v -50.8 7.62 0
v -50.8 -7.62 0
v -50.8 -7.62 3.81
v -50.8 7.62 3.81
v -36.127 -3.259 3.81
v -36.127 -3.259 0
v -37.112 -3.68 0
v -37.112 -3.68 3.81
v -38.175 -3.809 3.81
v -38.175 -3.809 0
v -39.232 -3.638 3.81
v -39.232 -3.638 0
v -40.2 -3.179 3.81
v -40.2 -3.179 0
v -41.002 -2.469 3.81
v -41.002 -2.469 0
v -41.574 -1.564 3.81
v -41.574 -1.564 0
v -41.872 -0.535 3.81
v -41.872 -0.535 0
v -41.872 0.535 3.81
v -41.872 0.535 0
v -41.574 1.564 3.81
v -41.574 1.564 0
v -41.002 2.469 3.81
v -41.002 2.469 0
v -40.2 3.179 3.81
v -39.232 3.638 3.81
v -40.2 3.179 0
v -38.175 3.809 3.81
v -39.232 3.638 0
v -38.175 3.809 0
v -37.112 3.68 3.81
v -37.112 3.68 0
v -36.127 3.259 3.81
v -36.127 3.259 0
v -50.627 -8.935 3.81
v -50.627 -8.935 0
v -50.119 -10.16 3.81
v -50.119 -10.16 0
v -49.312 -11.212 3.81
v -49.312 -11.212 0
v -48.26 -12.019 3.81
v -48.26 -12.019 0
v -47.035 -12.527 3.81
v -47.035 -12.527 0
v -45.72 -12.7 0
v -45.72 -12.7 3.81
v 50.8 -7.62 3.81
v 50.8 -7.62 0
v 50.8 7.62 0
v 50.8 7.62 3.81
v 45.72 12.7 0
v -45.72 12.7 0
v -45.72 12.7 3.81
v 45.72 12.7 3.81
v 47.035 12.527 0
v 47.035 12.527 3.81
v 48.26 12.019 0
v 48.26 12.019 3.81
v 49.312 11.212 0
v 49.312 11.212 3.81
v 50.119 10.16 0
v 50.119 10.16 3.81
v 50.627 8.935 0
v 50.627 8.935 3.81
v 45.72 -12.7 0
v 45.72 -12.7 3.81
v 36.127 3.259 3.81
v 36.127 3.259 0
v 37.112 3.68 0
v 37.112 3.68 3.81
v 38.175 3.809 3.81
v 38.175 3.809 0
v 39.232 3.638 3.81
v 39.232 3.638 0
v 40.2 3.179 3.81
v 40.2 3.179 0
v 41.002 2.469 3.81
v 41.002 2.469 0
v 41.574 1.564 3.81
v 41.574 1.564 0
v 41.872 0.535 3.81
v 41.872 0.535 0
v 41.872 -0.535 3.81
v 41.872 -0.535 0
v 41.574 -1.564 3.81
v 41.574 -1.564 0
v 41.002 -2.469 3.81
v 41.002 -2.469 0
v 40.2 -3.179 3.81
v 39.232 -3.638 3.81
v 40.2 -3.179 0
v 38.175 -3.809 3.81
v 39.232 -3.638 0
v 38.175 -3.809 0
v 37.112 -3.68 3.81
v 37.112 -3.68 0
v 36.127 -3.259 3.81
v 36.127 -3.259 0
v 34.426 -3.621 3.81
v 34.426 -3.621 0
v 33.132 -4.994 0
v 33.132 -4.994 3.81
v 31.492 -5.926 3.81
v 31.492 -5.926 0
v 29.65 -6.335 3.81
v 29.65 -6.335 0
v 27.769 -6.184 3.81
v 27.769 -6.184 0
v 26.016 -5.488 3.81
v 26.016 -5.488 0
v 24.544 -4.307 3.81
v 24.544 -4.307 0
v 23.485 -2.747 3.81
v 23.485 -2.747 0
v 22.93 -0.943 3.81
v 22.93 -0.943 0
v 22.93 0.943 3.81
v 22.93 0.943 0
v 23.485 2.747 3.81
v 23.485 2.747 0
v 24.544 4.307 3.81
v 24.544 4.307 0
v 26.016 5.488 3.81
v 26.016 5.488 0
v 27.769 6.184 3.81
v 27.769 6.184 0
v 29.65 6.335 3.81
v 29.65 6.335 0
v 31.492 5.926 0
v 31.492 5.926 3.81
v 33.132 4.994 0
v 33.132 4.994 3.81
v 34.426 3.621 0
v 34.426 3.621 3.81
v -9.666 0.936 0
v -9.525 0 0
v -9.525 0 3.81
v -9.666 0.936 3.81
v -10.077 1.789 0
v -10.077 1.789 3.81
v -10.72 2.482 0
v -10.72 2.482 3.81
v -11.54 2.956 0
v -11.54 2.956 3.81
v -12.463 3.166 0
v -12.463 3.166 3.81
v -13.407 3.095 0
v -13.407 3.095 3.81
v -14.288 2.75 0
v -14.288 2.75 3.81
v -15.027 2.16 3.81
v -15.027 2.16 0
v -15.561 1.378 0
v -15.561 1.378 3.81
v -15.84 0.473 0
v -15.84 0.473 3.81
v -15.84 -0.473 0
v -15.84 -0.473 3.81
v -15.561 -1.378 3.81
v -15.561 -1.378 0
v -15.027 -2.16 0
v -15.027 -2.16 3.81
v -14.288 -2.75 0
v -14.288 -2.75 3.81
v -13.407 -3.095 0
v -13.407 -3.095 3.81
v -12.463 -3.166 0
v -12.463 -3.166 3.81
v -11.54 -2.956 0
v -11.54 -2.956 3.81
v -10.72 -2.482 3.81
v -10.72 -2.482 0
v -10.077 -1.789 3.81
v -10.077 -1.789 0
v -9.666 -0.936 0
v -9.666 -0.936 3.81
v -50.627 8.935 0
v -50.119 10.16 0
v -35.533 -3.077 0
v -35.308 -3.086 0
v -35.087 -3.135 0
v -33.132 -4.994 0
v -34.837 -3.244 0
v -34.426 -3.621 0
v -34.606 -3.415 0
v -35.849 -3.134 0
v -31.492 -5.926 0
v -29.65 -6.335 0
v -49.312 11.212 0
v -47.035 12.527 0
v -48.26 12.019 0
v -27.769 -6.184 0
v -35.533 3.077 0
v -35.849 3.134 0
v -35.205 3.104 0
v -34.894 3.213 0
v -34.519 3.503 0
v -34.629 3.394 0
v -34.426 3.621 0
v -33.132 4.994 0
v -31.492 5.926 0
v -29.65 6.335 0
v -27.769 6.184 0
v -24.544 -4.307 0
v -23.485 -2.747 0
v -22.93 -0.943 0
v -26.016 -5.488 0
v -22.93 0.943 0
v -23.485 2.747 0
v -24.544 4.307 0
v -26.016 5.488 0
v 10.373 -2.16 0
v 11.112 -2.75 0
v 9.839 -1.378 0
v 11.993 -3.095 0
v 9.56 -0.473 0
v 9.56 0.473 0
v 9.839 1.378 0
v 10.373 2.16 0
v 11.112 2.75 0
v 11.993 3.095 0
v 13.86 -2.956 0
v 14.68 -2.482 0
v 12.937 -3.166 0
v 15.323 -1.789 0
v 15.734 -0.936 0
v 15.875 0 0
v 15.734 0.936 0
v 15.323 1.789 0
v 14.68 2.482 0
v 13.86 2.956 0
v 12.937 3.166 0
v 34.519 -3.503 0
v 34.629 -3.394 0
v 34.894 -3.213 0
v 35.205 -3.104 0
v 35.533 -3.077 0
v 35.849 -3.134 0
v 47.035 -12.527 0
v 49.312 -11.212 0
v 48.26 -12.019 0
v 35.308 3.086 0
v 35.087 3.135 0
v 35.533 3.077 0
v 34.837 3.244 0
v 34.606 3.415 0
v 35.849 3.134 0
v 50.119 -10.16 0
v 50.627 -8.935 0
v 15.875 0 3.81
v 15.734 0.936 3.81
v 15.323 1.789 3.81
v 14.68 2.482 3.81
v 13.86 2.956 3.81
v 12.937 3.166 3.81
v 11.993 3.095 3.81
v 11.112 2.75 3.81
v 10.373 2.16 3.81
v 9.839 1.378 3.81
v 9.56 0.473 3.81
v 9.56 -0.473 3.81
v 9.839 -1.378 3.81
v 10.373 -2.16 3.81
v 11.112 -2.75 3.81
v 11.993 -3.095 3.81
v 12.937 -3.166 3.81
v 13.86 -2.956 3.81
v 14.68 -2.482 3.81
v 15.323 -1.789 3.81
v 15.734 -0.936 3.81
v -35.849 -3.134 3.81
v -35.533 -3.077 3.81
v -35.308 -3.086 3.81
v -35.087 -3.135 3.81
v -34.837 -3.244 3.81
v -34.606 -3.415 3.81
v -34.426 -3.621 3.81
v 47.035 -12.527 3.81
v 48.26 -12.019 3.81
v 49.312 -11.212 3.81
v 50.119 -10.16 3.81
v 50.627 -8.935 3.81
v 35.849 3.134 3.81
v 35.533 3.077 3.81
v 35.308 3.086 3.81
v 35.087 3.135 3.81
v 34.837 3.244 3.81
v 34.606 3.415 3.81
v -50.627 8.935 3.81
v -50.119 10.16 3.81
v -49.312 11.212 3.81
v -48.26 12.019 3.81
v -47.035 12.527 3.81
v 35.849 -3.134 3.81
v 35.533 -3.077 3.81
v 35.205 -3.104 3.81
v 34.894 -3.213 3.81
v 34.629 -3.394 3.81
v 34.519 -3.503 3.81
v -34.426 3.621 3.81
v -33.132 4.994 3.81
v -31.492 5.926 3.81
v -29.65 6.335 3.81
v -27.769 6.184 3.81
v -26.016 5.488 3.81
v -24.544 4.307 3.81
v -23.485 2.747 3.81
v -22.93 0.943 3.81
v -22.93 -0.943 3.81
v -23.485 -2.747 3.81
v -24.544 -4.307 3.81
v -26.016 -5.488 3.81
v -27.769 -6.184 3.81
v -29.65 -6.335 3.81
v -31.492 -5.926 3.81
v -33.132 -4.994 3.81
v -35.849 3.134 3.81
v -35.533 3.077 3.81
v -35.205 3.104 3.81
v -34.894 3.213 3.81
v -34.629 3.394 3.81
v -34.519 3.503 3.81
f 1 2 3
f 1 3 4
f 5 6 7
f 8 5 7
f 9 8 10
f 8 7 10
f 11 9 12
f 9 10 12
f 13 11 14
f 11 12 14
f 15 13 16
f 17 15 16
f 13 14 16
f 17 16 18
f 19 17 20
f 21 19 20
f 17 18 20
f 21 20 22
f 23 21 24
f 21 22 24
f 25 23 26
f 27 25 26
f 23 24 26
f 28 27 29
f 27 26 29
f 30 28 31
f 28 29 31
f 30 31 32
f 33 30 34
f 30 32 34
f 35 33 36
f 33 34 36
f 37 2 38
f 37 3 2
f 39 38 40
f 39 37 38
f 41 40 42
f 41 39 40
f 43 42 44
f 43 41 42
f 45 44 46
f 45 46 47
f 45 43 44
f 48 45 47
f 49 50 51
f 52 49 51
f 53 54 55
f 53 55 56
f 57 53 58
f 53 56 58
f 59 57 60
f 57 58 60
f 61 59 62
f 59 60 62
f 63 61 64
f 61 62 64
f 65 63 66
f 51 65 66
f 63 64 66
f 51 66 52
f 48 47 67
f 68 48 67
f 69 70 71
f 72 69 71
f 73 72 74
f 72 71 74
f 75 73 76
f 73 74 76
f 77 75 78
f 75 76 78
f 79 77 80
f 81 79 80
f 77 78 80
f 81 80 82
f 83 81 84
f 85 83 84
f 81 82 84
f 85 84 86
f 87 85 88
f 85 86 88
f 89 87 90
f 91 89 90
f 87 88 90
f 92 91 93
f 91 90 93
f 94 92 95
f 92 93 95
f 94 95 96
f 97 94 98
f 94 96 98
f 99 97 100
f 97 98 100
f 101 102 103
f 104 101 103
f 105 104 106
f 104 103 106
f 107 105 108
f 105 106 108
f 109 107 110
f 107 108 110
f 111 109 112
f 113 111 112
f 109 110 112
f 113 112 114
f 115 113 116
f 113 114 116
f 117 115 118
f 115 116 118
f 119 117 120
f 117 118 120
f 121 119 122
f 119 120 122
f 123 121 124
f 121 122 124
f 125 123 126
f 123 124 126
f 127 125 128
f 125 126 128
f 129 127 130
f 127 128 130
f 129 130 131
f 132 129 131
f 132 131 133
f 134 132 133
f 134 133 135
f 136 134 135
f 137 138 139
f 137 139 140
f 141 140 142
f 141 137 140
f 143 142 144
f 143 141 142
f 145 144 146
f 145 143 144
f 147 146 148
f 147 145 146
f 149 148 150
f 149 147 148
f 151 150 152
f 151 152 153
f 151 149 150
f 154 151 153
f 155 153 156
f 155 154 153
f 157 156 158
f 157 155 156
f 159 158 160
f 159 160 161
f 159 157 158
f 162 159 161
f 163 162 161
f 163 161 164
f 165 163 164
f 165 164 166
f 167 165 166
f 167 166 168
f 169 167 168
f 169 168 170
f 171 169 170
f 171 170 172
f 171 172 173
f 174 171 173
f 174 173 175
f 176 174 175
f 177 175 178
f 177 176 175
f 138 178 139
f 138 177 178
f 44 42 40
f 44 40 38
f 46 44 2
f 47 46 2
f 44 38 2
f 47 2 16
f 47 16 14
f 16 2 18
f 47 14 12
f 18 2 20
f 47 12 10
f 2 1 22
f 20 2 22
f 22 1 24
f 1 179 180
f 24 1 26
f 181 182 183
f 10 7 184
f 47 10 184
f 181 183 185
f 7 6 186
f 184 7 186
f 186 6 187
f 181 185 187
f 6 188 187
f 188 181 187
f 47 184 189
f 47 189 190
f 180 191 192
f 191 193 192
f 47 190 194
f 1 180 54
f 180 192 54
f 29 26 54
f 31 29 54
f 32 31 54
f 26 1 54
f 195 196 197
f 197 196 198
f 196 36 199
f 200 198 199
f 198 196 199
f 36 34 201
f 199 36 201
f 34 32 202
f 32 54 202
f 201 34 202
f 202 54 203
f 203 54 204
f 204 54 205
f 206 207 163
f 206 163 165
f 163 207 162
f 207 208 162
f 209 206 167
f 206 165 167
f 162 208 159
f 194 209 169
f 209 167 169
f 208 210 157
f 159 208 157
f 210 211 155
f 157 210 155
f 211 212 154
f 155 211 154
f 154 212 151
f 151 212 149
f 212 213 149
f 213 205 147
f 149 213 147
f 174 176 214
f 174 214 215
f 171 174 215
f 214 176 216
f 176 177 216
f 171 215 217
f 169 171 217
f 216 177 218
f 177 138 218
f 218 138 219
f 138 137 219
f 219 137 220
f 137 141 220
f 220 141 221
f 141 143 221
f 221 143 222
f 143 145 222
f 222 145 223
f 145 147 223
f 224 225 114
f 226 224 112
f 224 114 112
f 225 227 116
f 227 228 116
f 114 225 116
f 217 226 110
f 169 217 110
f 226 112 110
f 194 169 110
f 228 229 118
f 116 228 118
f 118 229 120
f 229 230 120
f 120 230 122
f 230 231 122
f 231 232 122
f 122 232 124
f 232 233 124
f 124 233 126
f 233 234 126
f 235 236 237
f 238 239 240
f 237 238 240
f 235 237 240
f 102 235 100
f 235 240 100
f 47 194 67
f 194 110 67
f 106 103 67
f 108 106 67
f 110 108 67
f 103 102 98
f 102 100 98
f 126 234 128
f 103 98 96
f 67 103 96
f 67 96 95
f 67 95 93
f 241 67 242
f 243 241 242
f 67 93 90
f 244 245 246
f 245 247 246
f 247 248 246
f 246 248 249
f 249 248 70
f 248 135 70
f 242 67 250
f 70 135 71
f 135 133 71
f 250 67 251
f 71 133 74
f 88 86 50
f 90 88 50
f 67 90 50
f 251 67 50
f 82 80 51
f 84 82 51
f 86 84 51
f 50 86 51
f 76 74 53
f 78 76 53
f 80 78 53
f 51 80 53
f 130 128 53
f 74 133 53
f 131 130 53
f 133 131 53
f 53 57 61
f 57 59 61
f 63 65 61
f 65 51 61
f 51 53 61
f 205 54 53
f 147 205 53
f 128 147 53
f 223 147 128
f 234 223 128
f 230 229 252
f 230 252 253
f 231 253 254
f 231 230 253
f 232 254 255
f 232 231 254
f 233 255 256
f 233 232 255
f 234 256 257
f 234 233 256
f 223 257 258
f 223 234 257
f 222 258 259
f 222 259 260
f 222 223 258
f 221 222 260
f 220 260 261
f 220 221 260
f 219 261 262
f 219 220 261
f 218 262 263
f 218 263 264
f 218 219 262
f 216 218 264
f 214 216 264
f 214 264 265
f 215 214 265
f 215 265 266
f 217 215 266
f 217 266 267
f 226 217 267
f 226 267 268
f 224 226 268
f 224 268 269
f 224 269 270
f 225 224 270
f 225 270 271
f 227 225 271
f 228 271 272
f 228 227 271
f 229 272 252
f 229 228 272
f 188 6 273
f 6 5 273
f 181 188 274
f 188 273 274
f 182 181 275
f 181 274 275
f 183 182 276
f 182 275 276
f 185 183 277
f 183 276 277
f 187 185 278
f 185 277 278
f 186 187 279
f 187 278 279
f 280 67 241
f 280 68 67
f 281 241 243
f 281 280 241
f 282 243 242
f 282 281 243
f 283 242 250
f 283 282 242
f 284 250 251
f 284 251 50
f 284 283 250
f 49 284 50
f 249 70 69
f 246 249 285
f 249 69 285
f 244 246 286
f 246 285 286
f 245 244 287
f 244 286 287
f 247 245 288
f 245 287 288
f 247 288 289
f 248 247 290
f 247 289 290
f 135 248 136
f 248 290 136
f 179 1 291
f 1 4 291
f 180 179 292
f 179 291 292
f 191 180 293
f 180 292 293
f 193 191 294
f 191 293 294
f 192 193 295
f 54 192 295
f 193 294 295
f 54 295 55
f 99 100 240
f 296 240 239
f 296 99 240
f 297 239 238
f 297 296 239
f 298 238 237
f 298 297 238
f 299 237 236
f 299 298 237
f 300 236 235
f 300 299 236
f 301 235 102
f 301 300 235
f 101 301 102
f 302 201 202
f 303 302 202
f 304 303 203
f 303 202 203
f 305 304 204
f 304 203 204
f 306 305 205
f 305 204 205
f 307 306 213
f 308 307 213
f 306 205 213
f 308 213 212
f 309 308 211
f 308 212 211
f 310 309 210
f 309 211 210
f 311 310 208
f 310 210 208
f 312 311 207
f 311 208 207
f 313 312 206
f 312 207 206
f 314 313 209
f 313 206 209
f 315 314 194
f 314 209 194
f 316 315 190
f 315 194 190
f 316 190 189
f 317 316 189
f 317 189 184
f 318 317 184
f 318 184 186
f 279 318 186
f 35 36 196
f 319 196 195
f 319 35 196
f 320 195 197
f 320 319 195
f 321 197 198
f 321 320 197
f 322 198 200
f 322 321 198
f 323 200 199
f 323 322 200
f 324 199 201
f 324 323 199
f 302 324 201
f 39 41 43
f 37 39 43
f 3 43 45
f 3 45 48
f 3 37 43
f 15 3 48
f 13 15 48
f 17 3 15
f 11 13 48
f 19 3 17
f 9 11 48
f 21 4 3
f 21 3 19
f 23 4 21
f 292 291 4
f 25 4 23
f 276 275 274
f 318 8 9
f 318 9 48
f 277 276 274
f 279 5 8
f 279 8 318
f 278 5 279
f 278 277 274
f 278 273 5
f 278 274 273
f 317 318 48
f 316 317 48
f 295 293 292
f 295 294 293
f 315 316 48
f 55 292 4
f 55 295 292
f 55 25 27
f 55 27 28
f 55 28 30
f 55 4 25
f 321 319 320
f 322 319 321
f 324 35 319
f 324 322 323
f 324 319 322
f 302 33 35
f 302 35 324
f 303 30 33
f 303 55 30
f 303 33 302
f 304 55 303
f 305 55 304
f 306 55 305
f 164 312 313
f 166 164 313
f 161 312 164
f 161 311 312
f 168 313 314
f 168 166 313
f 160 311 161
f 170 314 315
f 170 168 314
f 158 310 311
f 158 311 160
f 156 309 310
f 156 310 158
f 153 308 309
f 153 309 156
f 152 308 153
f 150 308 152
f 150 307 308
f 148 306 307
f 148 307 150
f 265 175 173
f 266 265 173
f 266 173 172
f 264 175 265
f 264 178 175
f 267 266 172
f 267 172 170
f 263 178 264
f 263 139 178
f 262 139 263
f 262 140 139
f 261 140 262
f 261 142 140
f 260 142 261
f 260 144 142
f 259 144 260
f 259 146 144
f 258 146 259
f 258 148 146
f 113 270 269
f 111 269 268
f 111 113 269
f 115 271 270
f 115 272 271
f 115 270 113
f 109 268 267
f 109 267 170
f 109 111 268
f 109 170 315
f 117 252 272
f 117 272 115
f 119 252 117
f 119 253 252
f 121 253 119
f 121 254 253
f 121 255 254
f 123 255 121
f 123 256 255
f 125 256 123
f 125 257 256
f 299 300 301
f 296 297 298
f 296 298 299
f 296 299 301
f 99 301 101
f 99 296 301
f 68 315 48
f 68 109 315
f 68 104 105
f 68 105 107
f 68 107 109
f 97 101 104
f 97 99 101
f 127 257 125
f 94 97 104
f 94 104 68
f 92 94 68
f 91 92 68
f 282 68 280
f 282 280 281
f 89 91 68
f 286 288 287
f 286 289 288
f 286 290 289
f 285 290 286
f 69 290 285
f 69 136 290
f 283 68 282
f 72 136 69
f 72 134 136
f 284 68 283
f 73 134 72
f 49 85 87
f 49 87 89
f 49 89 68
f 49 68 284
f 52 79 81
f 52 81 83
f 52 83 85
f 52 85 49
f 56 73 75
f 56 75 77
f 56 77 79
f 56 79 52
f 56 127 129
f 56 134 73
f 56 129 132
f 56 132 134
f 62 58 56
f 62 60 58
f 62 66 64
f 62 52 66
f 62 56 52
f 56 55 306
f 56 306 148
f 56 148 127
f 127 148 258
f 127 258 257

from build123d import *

# Parameters (mm, degrees)
F0_W     = 101.6
F0_H     = 25.4
F0_R     = 3.175
F1_DEPTH = 3.81
F2_R     = 1.27
F3_R     = 5.08


with BuildPart() as f1:
    # F0 (on Top) → F1 (new body)
    with BuildSketch(Plane.XY):
        Rectangle(F0_W, F0_H)
        with BuildLine():
            ThreePointArc((-35.1064285714, 2.3568262774), (-22.86, 0), (-35.1064285714, -2.3568262774))
            ThreePointArc((-35.1064285714, -2.3568262774), (-41.91, 0), (-35.1064285714, 2.3568262774))
        make_face(mode=Mode.SUBTRACT)
        with Locations((-12.7, 0)):
            Circle(F0_R, mode=Mode.SUBTRACT)
        with Locations((12.7, 0)):
            Circle(F0_R, mode=Mode.SUBTRACT)
        with BuildLine():
            ThreePointArc((35.1064285714, -2.3568262774), (22.86, 0), (35.1064285714, 2.3568262774))
            ThreePointArc((35.1064285714, 2.3568262774), (41.91, 0), (35.1064285714, -2.3568262774))
        make_face(mode=Mode.SUBTRACT)
    extrude(amount=F1_DEPTH)

    # F2
    f2_edges = [f1.edges().sort_by_distance(p)[0] for p in [
        (-35.106429, -2.356826, 1.905),
        (35.106429, 2.356826, 1.905),
        (-35.106429, 2.356826, 1.905),
        (35.106429, -2.356826, 1.905),
    ]]
    fillet(f2_edges, radius=F2_R)

    # F3
    f3_edges = [f1.edges().sort_by_distance(p)[0] for p in [
        (-50.8, 12.7, 1.905),
        (-50.8, -12.7, 1.905),
        (50.8, -12.7, 1.905),
        (50.8, 12.7, 1.905),
    ]]
    fillet(f3_edges, radius=F3_R)


solid = f1.part
